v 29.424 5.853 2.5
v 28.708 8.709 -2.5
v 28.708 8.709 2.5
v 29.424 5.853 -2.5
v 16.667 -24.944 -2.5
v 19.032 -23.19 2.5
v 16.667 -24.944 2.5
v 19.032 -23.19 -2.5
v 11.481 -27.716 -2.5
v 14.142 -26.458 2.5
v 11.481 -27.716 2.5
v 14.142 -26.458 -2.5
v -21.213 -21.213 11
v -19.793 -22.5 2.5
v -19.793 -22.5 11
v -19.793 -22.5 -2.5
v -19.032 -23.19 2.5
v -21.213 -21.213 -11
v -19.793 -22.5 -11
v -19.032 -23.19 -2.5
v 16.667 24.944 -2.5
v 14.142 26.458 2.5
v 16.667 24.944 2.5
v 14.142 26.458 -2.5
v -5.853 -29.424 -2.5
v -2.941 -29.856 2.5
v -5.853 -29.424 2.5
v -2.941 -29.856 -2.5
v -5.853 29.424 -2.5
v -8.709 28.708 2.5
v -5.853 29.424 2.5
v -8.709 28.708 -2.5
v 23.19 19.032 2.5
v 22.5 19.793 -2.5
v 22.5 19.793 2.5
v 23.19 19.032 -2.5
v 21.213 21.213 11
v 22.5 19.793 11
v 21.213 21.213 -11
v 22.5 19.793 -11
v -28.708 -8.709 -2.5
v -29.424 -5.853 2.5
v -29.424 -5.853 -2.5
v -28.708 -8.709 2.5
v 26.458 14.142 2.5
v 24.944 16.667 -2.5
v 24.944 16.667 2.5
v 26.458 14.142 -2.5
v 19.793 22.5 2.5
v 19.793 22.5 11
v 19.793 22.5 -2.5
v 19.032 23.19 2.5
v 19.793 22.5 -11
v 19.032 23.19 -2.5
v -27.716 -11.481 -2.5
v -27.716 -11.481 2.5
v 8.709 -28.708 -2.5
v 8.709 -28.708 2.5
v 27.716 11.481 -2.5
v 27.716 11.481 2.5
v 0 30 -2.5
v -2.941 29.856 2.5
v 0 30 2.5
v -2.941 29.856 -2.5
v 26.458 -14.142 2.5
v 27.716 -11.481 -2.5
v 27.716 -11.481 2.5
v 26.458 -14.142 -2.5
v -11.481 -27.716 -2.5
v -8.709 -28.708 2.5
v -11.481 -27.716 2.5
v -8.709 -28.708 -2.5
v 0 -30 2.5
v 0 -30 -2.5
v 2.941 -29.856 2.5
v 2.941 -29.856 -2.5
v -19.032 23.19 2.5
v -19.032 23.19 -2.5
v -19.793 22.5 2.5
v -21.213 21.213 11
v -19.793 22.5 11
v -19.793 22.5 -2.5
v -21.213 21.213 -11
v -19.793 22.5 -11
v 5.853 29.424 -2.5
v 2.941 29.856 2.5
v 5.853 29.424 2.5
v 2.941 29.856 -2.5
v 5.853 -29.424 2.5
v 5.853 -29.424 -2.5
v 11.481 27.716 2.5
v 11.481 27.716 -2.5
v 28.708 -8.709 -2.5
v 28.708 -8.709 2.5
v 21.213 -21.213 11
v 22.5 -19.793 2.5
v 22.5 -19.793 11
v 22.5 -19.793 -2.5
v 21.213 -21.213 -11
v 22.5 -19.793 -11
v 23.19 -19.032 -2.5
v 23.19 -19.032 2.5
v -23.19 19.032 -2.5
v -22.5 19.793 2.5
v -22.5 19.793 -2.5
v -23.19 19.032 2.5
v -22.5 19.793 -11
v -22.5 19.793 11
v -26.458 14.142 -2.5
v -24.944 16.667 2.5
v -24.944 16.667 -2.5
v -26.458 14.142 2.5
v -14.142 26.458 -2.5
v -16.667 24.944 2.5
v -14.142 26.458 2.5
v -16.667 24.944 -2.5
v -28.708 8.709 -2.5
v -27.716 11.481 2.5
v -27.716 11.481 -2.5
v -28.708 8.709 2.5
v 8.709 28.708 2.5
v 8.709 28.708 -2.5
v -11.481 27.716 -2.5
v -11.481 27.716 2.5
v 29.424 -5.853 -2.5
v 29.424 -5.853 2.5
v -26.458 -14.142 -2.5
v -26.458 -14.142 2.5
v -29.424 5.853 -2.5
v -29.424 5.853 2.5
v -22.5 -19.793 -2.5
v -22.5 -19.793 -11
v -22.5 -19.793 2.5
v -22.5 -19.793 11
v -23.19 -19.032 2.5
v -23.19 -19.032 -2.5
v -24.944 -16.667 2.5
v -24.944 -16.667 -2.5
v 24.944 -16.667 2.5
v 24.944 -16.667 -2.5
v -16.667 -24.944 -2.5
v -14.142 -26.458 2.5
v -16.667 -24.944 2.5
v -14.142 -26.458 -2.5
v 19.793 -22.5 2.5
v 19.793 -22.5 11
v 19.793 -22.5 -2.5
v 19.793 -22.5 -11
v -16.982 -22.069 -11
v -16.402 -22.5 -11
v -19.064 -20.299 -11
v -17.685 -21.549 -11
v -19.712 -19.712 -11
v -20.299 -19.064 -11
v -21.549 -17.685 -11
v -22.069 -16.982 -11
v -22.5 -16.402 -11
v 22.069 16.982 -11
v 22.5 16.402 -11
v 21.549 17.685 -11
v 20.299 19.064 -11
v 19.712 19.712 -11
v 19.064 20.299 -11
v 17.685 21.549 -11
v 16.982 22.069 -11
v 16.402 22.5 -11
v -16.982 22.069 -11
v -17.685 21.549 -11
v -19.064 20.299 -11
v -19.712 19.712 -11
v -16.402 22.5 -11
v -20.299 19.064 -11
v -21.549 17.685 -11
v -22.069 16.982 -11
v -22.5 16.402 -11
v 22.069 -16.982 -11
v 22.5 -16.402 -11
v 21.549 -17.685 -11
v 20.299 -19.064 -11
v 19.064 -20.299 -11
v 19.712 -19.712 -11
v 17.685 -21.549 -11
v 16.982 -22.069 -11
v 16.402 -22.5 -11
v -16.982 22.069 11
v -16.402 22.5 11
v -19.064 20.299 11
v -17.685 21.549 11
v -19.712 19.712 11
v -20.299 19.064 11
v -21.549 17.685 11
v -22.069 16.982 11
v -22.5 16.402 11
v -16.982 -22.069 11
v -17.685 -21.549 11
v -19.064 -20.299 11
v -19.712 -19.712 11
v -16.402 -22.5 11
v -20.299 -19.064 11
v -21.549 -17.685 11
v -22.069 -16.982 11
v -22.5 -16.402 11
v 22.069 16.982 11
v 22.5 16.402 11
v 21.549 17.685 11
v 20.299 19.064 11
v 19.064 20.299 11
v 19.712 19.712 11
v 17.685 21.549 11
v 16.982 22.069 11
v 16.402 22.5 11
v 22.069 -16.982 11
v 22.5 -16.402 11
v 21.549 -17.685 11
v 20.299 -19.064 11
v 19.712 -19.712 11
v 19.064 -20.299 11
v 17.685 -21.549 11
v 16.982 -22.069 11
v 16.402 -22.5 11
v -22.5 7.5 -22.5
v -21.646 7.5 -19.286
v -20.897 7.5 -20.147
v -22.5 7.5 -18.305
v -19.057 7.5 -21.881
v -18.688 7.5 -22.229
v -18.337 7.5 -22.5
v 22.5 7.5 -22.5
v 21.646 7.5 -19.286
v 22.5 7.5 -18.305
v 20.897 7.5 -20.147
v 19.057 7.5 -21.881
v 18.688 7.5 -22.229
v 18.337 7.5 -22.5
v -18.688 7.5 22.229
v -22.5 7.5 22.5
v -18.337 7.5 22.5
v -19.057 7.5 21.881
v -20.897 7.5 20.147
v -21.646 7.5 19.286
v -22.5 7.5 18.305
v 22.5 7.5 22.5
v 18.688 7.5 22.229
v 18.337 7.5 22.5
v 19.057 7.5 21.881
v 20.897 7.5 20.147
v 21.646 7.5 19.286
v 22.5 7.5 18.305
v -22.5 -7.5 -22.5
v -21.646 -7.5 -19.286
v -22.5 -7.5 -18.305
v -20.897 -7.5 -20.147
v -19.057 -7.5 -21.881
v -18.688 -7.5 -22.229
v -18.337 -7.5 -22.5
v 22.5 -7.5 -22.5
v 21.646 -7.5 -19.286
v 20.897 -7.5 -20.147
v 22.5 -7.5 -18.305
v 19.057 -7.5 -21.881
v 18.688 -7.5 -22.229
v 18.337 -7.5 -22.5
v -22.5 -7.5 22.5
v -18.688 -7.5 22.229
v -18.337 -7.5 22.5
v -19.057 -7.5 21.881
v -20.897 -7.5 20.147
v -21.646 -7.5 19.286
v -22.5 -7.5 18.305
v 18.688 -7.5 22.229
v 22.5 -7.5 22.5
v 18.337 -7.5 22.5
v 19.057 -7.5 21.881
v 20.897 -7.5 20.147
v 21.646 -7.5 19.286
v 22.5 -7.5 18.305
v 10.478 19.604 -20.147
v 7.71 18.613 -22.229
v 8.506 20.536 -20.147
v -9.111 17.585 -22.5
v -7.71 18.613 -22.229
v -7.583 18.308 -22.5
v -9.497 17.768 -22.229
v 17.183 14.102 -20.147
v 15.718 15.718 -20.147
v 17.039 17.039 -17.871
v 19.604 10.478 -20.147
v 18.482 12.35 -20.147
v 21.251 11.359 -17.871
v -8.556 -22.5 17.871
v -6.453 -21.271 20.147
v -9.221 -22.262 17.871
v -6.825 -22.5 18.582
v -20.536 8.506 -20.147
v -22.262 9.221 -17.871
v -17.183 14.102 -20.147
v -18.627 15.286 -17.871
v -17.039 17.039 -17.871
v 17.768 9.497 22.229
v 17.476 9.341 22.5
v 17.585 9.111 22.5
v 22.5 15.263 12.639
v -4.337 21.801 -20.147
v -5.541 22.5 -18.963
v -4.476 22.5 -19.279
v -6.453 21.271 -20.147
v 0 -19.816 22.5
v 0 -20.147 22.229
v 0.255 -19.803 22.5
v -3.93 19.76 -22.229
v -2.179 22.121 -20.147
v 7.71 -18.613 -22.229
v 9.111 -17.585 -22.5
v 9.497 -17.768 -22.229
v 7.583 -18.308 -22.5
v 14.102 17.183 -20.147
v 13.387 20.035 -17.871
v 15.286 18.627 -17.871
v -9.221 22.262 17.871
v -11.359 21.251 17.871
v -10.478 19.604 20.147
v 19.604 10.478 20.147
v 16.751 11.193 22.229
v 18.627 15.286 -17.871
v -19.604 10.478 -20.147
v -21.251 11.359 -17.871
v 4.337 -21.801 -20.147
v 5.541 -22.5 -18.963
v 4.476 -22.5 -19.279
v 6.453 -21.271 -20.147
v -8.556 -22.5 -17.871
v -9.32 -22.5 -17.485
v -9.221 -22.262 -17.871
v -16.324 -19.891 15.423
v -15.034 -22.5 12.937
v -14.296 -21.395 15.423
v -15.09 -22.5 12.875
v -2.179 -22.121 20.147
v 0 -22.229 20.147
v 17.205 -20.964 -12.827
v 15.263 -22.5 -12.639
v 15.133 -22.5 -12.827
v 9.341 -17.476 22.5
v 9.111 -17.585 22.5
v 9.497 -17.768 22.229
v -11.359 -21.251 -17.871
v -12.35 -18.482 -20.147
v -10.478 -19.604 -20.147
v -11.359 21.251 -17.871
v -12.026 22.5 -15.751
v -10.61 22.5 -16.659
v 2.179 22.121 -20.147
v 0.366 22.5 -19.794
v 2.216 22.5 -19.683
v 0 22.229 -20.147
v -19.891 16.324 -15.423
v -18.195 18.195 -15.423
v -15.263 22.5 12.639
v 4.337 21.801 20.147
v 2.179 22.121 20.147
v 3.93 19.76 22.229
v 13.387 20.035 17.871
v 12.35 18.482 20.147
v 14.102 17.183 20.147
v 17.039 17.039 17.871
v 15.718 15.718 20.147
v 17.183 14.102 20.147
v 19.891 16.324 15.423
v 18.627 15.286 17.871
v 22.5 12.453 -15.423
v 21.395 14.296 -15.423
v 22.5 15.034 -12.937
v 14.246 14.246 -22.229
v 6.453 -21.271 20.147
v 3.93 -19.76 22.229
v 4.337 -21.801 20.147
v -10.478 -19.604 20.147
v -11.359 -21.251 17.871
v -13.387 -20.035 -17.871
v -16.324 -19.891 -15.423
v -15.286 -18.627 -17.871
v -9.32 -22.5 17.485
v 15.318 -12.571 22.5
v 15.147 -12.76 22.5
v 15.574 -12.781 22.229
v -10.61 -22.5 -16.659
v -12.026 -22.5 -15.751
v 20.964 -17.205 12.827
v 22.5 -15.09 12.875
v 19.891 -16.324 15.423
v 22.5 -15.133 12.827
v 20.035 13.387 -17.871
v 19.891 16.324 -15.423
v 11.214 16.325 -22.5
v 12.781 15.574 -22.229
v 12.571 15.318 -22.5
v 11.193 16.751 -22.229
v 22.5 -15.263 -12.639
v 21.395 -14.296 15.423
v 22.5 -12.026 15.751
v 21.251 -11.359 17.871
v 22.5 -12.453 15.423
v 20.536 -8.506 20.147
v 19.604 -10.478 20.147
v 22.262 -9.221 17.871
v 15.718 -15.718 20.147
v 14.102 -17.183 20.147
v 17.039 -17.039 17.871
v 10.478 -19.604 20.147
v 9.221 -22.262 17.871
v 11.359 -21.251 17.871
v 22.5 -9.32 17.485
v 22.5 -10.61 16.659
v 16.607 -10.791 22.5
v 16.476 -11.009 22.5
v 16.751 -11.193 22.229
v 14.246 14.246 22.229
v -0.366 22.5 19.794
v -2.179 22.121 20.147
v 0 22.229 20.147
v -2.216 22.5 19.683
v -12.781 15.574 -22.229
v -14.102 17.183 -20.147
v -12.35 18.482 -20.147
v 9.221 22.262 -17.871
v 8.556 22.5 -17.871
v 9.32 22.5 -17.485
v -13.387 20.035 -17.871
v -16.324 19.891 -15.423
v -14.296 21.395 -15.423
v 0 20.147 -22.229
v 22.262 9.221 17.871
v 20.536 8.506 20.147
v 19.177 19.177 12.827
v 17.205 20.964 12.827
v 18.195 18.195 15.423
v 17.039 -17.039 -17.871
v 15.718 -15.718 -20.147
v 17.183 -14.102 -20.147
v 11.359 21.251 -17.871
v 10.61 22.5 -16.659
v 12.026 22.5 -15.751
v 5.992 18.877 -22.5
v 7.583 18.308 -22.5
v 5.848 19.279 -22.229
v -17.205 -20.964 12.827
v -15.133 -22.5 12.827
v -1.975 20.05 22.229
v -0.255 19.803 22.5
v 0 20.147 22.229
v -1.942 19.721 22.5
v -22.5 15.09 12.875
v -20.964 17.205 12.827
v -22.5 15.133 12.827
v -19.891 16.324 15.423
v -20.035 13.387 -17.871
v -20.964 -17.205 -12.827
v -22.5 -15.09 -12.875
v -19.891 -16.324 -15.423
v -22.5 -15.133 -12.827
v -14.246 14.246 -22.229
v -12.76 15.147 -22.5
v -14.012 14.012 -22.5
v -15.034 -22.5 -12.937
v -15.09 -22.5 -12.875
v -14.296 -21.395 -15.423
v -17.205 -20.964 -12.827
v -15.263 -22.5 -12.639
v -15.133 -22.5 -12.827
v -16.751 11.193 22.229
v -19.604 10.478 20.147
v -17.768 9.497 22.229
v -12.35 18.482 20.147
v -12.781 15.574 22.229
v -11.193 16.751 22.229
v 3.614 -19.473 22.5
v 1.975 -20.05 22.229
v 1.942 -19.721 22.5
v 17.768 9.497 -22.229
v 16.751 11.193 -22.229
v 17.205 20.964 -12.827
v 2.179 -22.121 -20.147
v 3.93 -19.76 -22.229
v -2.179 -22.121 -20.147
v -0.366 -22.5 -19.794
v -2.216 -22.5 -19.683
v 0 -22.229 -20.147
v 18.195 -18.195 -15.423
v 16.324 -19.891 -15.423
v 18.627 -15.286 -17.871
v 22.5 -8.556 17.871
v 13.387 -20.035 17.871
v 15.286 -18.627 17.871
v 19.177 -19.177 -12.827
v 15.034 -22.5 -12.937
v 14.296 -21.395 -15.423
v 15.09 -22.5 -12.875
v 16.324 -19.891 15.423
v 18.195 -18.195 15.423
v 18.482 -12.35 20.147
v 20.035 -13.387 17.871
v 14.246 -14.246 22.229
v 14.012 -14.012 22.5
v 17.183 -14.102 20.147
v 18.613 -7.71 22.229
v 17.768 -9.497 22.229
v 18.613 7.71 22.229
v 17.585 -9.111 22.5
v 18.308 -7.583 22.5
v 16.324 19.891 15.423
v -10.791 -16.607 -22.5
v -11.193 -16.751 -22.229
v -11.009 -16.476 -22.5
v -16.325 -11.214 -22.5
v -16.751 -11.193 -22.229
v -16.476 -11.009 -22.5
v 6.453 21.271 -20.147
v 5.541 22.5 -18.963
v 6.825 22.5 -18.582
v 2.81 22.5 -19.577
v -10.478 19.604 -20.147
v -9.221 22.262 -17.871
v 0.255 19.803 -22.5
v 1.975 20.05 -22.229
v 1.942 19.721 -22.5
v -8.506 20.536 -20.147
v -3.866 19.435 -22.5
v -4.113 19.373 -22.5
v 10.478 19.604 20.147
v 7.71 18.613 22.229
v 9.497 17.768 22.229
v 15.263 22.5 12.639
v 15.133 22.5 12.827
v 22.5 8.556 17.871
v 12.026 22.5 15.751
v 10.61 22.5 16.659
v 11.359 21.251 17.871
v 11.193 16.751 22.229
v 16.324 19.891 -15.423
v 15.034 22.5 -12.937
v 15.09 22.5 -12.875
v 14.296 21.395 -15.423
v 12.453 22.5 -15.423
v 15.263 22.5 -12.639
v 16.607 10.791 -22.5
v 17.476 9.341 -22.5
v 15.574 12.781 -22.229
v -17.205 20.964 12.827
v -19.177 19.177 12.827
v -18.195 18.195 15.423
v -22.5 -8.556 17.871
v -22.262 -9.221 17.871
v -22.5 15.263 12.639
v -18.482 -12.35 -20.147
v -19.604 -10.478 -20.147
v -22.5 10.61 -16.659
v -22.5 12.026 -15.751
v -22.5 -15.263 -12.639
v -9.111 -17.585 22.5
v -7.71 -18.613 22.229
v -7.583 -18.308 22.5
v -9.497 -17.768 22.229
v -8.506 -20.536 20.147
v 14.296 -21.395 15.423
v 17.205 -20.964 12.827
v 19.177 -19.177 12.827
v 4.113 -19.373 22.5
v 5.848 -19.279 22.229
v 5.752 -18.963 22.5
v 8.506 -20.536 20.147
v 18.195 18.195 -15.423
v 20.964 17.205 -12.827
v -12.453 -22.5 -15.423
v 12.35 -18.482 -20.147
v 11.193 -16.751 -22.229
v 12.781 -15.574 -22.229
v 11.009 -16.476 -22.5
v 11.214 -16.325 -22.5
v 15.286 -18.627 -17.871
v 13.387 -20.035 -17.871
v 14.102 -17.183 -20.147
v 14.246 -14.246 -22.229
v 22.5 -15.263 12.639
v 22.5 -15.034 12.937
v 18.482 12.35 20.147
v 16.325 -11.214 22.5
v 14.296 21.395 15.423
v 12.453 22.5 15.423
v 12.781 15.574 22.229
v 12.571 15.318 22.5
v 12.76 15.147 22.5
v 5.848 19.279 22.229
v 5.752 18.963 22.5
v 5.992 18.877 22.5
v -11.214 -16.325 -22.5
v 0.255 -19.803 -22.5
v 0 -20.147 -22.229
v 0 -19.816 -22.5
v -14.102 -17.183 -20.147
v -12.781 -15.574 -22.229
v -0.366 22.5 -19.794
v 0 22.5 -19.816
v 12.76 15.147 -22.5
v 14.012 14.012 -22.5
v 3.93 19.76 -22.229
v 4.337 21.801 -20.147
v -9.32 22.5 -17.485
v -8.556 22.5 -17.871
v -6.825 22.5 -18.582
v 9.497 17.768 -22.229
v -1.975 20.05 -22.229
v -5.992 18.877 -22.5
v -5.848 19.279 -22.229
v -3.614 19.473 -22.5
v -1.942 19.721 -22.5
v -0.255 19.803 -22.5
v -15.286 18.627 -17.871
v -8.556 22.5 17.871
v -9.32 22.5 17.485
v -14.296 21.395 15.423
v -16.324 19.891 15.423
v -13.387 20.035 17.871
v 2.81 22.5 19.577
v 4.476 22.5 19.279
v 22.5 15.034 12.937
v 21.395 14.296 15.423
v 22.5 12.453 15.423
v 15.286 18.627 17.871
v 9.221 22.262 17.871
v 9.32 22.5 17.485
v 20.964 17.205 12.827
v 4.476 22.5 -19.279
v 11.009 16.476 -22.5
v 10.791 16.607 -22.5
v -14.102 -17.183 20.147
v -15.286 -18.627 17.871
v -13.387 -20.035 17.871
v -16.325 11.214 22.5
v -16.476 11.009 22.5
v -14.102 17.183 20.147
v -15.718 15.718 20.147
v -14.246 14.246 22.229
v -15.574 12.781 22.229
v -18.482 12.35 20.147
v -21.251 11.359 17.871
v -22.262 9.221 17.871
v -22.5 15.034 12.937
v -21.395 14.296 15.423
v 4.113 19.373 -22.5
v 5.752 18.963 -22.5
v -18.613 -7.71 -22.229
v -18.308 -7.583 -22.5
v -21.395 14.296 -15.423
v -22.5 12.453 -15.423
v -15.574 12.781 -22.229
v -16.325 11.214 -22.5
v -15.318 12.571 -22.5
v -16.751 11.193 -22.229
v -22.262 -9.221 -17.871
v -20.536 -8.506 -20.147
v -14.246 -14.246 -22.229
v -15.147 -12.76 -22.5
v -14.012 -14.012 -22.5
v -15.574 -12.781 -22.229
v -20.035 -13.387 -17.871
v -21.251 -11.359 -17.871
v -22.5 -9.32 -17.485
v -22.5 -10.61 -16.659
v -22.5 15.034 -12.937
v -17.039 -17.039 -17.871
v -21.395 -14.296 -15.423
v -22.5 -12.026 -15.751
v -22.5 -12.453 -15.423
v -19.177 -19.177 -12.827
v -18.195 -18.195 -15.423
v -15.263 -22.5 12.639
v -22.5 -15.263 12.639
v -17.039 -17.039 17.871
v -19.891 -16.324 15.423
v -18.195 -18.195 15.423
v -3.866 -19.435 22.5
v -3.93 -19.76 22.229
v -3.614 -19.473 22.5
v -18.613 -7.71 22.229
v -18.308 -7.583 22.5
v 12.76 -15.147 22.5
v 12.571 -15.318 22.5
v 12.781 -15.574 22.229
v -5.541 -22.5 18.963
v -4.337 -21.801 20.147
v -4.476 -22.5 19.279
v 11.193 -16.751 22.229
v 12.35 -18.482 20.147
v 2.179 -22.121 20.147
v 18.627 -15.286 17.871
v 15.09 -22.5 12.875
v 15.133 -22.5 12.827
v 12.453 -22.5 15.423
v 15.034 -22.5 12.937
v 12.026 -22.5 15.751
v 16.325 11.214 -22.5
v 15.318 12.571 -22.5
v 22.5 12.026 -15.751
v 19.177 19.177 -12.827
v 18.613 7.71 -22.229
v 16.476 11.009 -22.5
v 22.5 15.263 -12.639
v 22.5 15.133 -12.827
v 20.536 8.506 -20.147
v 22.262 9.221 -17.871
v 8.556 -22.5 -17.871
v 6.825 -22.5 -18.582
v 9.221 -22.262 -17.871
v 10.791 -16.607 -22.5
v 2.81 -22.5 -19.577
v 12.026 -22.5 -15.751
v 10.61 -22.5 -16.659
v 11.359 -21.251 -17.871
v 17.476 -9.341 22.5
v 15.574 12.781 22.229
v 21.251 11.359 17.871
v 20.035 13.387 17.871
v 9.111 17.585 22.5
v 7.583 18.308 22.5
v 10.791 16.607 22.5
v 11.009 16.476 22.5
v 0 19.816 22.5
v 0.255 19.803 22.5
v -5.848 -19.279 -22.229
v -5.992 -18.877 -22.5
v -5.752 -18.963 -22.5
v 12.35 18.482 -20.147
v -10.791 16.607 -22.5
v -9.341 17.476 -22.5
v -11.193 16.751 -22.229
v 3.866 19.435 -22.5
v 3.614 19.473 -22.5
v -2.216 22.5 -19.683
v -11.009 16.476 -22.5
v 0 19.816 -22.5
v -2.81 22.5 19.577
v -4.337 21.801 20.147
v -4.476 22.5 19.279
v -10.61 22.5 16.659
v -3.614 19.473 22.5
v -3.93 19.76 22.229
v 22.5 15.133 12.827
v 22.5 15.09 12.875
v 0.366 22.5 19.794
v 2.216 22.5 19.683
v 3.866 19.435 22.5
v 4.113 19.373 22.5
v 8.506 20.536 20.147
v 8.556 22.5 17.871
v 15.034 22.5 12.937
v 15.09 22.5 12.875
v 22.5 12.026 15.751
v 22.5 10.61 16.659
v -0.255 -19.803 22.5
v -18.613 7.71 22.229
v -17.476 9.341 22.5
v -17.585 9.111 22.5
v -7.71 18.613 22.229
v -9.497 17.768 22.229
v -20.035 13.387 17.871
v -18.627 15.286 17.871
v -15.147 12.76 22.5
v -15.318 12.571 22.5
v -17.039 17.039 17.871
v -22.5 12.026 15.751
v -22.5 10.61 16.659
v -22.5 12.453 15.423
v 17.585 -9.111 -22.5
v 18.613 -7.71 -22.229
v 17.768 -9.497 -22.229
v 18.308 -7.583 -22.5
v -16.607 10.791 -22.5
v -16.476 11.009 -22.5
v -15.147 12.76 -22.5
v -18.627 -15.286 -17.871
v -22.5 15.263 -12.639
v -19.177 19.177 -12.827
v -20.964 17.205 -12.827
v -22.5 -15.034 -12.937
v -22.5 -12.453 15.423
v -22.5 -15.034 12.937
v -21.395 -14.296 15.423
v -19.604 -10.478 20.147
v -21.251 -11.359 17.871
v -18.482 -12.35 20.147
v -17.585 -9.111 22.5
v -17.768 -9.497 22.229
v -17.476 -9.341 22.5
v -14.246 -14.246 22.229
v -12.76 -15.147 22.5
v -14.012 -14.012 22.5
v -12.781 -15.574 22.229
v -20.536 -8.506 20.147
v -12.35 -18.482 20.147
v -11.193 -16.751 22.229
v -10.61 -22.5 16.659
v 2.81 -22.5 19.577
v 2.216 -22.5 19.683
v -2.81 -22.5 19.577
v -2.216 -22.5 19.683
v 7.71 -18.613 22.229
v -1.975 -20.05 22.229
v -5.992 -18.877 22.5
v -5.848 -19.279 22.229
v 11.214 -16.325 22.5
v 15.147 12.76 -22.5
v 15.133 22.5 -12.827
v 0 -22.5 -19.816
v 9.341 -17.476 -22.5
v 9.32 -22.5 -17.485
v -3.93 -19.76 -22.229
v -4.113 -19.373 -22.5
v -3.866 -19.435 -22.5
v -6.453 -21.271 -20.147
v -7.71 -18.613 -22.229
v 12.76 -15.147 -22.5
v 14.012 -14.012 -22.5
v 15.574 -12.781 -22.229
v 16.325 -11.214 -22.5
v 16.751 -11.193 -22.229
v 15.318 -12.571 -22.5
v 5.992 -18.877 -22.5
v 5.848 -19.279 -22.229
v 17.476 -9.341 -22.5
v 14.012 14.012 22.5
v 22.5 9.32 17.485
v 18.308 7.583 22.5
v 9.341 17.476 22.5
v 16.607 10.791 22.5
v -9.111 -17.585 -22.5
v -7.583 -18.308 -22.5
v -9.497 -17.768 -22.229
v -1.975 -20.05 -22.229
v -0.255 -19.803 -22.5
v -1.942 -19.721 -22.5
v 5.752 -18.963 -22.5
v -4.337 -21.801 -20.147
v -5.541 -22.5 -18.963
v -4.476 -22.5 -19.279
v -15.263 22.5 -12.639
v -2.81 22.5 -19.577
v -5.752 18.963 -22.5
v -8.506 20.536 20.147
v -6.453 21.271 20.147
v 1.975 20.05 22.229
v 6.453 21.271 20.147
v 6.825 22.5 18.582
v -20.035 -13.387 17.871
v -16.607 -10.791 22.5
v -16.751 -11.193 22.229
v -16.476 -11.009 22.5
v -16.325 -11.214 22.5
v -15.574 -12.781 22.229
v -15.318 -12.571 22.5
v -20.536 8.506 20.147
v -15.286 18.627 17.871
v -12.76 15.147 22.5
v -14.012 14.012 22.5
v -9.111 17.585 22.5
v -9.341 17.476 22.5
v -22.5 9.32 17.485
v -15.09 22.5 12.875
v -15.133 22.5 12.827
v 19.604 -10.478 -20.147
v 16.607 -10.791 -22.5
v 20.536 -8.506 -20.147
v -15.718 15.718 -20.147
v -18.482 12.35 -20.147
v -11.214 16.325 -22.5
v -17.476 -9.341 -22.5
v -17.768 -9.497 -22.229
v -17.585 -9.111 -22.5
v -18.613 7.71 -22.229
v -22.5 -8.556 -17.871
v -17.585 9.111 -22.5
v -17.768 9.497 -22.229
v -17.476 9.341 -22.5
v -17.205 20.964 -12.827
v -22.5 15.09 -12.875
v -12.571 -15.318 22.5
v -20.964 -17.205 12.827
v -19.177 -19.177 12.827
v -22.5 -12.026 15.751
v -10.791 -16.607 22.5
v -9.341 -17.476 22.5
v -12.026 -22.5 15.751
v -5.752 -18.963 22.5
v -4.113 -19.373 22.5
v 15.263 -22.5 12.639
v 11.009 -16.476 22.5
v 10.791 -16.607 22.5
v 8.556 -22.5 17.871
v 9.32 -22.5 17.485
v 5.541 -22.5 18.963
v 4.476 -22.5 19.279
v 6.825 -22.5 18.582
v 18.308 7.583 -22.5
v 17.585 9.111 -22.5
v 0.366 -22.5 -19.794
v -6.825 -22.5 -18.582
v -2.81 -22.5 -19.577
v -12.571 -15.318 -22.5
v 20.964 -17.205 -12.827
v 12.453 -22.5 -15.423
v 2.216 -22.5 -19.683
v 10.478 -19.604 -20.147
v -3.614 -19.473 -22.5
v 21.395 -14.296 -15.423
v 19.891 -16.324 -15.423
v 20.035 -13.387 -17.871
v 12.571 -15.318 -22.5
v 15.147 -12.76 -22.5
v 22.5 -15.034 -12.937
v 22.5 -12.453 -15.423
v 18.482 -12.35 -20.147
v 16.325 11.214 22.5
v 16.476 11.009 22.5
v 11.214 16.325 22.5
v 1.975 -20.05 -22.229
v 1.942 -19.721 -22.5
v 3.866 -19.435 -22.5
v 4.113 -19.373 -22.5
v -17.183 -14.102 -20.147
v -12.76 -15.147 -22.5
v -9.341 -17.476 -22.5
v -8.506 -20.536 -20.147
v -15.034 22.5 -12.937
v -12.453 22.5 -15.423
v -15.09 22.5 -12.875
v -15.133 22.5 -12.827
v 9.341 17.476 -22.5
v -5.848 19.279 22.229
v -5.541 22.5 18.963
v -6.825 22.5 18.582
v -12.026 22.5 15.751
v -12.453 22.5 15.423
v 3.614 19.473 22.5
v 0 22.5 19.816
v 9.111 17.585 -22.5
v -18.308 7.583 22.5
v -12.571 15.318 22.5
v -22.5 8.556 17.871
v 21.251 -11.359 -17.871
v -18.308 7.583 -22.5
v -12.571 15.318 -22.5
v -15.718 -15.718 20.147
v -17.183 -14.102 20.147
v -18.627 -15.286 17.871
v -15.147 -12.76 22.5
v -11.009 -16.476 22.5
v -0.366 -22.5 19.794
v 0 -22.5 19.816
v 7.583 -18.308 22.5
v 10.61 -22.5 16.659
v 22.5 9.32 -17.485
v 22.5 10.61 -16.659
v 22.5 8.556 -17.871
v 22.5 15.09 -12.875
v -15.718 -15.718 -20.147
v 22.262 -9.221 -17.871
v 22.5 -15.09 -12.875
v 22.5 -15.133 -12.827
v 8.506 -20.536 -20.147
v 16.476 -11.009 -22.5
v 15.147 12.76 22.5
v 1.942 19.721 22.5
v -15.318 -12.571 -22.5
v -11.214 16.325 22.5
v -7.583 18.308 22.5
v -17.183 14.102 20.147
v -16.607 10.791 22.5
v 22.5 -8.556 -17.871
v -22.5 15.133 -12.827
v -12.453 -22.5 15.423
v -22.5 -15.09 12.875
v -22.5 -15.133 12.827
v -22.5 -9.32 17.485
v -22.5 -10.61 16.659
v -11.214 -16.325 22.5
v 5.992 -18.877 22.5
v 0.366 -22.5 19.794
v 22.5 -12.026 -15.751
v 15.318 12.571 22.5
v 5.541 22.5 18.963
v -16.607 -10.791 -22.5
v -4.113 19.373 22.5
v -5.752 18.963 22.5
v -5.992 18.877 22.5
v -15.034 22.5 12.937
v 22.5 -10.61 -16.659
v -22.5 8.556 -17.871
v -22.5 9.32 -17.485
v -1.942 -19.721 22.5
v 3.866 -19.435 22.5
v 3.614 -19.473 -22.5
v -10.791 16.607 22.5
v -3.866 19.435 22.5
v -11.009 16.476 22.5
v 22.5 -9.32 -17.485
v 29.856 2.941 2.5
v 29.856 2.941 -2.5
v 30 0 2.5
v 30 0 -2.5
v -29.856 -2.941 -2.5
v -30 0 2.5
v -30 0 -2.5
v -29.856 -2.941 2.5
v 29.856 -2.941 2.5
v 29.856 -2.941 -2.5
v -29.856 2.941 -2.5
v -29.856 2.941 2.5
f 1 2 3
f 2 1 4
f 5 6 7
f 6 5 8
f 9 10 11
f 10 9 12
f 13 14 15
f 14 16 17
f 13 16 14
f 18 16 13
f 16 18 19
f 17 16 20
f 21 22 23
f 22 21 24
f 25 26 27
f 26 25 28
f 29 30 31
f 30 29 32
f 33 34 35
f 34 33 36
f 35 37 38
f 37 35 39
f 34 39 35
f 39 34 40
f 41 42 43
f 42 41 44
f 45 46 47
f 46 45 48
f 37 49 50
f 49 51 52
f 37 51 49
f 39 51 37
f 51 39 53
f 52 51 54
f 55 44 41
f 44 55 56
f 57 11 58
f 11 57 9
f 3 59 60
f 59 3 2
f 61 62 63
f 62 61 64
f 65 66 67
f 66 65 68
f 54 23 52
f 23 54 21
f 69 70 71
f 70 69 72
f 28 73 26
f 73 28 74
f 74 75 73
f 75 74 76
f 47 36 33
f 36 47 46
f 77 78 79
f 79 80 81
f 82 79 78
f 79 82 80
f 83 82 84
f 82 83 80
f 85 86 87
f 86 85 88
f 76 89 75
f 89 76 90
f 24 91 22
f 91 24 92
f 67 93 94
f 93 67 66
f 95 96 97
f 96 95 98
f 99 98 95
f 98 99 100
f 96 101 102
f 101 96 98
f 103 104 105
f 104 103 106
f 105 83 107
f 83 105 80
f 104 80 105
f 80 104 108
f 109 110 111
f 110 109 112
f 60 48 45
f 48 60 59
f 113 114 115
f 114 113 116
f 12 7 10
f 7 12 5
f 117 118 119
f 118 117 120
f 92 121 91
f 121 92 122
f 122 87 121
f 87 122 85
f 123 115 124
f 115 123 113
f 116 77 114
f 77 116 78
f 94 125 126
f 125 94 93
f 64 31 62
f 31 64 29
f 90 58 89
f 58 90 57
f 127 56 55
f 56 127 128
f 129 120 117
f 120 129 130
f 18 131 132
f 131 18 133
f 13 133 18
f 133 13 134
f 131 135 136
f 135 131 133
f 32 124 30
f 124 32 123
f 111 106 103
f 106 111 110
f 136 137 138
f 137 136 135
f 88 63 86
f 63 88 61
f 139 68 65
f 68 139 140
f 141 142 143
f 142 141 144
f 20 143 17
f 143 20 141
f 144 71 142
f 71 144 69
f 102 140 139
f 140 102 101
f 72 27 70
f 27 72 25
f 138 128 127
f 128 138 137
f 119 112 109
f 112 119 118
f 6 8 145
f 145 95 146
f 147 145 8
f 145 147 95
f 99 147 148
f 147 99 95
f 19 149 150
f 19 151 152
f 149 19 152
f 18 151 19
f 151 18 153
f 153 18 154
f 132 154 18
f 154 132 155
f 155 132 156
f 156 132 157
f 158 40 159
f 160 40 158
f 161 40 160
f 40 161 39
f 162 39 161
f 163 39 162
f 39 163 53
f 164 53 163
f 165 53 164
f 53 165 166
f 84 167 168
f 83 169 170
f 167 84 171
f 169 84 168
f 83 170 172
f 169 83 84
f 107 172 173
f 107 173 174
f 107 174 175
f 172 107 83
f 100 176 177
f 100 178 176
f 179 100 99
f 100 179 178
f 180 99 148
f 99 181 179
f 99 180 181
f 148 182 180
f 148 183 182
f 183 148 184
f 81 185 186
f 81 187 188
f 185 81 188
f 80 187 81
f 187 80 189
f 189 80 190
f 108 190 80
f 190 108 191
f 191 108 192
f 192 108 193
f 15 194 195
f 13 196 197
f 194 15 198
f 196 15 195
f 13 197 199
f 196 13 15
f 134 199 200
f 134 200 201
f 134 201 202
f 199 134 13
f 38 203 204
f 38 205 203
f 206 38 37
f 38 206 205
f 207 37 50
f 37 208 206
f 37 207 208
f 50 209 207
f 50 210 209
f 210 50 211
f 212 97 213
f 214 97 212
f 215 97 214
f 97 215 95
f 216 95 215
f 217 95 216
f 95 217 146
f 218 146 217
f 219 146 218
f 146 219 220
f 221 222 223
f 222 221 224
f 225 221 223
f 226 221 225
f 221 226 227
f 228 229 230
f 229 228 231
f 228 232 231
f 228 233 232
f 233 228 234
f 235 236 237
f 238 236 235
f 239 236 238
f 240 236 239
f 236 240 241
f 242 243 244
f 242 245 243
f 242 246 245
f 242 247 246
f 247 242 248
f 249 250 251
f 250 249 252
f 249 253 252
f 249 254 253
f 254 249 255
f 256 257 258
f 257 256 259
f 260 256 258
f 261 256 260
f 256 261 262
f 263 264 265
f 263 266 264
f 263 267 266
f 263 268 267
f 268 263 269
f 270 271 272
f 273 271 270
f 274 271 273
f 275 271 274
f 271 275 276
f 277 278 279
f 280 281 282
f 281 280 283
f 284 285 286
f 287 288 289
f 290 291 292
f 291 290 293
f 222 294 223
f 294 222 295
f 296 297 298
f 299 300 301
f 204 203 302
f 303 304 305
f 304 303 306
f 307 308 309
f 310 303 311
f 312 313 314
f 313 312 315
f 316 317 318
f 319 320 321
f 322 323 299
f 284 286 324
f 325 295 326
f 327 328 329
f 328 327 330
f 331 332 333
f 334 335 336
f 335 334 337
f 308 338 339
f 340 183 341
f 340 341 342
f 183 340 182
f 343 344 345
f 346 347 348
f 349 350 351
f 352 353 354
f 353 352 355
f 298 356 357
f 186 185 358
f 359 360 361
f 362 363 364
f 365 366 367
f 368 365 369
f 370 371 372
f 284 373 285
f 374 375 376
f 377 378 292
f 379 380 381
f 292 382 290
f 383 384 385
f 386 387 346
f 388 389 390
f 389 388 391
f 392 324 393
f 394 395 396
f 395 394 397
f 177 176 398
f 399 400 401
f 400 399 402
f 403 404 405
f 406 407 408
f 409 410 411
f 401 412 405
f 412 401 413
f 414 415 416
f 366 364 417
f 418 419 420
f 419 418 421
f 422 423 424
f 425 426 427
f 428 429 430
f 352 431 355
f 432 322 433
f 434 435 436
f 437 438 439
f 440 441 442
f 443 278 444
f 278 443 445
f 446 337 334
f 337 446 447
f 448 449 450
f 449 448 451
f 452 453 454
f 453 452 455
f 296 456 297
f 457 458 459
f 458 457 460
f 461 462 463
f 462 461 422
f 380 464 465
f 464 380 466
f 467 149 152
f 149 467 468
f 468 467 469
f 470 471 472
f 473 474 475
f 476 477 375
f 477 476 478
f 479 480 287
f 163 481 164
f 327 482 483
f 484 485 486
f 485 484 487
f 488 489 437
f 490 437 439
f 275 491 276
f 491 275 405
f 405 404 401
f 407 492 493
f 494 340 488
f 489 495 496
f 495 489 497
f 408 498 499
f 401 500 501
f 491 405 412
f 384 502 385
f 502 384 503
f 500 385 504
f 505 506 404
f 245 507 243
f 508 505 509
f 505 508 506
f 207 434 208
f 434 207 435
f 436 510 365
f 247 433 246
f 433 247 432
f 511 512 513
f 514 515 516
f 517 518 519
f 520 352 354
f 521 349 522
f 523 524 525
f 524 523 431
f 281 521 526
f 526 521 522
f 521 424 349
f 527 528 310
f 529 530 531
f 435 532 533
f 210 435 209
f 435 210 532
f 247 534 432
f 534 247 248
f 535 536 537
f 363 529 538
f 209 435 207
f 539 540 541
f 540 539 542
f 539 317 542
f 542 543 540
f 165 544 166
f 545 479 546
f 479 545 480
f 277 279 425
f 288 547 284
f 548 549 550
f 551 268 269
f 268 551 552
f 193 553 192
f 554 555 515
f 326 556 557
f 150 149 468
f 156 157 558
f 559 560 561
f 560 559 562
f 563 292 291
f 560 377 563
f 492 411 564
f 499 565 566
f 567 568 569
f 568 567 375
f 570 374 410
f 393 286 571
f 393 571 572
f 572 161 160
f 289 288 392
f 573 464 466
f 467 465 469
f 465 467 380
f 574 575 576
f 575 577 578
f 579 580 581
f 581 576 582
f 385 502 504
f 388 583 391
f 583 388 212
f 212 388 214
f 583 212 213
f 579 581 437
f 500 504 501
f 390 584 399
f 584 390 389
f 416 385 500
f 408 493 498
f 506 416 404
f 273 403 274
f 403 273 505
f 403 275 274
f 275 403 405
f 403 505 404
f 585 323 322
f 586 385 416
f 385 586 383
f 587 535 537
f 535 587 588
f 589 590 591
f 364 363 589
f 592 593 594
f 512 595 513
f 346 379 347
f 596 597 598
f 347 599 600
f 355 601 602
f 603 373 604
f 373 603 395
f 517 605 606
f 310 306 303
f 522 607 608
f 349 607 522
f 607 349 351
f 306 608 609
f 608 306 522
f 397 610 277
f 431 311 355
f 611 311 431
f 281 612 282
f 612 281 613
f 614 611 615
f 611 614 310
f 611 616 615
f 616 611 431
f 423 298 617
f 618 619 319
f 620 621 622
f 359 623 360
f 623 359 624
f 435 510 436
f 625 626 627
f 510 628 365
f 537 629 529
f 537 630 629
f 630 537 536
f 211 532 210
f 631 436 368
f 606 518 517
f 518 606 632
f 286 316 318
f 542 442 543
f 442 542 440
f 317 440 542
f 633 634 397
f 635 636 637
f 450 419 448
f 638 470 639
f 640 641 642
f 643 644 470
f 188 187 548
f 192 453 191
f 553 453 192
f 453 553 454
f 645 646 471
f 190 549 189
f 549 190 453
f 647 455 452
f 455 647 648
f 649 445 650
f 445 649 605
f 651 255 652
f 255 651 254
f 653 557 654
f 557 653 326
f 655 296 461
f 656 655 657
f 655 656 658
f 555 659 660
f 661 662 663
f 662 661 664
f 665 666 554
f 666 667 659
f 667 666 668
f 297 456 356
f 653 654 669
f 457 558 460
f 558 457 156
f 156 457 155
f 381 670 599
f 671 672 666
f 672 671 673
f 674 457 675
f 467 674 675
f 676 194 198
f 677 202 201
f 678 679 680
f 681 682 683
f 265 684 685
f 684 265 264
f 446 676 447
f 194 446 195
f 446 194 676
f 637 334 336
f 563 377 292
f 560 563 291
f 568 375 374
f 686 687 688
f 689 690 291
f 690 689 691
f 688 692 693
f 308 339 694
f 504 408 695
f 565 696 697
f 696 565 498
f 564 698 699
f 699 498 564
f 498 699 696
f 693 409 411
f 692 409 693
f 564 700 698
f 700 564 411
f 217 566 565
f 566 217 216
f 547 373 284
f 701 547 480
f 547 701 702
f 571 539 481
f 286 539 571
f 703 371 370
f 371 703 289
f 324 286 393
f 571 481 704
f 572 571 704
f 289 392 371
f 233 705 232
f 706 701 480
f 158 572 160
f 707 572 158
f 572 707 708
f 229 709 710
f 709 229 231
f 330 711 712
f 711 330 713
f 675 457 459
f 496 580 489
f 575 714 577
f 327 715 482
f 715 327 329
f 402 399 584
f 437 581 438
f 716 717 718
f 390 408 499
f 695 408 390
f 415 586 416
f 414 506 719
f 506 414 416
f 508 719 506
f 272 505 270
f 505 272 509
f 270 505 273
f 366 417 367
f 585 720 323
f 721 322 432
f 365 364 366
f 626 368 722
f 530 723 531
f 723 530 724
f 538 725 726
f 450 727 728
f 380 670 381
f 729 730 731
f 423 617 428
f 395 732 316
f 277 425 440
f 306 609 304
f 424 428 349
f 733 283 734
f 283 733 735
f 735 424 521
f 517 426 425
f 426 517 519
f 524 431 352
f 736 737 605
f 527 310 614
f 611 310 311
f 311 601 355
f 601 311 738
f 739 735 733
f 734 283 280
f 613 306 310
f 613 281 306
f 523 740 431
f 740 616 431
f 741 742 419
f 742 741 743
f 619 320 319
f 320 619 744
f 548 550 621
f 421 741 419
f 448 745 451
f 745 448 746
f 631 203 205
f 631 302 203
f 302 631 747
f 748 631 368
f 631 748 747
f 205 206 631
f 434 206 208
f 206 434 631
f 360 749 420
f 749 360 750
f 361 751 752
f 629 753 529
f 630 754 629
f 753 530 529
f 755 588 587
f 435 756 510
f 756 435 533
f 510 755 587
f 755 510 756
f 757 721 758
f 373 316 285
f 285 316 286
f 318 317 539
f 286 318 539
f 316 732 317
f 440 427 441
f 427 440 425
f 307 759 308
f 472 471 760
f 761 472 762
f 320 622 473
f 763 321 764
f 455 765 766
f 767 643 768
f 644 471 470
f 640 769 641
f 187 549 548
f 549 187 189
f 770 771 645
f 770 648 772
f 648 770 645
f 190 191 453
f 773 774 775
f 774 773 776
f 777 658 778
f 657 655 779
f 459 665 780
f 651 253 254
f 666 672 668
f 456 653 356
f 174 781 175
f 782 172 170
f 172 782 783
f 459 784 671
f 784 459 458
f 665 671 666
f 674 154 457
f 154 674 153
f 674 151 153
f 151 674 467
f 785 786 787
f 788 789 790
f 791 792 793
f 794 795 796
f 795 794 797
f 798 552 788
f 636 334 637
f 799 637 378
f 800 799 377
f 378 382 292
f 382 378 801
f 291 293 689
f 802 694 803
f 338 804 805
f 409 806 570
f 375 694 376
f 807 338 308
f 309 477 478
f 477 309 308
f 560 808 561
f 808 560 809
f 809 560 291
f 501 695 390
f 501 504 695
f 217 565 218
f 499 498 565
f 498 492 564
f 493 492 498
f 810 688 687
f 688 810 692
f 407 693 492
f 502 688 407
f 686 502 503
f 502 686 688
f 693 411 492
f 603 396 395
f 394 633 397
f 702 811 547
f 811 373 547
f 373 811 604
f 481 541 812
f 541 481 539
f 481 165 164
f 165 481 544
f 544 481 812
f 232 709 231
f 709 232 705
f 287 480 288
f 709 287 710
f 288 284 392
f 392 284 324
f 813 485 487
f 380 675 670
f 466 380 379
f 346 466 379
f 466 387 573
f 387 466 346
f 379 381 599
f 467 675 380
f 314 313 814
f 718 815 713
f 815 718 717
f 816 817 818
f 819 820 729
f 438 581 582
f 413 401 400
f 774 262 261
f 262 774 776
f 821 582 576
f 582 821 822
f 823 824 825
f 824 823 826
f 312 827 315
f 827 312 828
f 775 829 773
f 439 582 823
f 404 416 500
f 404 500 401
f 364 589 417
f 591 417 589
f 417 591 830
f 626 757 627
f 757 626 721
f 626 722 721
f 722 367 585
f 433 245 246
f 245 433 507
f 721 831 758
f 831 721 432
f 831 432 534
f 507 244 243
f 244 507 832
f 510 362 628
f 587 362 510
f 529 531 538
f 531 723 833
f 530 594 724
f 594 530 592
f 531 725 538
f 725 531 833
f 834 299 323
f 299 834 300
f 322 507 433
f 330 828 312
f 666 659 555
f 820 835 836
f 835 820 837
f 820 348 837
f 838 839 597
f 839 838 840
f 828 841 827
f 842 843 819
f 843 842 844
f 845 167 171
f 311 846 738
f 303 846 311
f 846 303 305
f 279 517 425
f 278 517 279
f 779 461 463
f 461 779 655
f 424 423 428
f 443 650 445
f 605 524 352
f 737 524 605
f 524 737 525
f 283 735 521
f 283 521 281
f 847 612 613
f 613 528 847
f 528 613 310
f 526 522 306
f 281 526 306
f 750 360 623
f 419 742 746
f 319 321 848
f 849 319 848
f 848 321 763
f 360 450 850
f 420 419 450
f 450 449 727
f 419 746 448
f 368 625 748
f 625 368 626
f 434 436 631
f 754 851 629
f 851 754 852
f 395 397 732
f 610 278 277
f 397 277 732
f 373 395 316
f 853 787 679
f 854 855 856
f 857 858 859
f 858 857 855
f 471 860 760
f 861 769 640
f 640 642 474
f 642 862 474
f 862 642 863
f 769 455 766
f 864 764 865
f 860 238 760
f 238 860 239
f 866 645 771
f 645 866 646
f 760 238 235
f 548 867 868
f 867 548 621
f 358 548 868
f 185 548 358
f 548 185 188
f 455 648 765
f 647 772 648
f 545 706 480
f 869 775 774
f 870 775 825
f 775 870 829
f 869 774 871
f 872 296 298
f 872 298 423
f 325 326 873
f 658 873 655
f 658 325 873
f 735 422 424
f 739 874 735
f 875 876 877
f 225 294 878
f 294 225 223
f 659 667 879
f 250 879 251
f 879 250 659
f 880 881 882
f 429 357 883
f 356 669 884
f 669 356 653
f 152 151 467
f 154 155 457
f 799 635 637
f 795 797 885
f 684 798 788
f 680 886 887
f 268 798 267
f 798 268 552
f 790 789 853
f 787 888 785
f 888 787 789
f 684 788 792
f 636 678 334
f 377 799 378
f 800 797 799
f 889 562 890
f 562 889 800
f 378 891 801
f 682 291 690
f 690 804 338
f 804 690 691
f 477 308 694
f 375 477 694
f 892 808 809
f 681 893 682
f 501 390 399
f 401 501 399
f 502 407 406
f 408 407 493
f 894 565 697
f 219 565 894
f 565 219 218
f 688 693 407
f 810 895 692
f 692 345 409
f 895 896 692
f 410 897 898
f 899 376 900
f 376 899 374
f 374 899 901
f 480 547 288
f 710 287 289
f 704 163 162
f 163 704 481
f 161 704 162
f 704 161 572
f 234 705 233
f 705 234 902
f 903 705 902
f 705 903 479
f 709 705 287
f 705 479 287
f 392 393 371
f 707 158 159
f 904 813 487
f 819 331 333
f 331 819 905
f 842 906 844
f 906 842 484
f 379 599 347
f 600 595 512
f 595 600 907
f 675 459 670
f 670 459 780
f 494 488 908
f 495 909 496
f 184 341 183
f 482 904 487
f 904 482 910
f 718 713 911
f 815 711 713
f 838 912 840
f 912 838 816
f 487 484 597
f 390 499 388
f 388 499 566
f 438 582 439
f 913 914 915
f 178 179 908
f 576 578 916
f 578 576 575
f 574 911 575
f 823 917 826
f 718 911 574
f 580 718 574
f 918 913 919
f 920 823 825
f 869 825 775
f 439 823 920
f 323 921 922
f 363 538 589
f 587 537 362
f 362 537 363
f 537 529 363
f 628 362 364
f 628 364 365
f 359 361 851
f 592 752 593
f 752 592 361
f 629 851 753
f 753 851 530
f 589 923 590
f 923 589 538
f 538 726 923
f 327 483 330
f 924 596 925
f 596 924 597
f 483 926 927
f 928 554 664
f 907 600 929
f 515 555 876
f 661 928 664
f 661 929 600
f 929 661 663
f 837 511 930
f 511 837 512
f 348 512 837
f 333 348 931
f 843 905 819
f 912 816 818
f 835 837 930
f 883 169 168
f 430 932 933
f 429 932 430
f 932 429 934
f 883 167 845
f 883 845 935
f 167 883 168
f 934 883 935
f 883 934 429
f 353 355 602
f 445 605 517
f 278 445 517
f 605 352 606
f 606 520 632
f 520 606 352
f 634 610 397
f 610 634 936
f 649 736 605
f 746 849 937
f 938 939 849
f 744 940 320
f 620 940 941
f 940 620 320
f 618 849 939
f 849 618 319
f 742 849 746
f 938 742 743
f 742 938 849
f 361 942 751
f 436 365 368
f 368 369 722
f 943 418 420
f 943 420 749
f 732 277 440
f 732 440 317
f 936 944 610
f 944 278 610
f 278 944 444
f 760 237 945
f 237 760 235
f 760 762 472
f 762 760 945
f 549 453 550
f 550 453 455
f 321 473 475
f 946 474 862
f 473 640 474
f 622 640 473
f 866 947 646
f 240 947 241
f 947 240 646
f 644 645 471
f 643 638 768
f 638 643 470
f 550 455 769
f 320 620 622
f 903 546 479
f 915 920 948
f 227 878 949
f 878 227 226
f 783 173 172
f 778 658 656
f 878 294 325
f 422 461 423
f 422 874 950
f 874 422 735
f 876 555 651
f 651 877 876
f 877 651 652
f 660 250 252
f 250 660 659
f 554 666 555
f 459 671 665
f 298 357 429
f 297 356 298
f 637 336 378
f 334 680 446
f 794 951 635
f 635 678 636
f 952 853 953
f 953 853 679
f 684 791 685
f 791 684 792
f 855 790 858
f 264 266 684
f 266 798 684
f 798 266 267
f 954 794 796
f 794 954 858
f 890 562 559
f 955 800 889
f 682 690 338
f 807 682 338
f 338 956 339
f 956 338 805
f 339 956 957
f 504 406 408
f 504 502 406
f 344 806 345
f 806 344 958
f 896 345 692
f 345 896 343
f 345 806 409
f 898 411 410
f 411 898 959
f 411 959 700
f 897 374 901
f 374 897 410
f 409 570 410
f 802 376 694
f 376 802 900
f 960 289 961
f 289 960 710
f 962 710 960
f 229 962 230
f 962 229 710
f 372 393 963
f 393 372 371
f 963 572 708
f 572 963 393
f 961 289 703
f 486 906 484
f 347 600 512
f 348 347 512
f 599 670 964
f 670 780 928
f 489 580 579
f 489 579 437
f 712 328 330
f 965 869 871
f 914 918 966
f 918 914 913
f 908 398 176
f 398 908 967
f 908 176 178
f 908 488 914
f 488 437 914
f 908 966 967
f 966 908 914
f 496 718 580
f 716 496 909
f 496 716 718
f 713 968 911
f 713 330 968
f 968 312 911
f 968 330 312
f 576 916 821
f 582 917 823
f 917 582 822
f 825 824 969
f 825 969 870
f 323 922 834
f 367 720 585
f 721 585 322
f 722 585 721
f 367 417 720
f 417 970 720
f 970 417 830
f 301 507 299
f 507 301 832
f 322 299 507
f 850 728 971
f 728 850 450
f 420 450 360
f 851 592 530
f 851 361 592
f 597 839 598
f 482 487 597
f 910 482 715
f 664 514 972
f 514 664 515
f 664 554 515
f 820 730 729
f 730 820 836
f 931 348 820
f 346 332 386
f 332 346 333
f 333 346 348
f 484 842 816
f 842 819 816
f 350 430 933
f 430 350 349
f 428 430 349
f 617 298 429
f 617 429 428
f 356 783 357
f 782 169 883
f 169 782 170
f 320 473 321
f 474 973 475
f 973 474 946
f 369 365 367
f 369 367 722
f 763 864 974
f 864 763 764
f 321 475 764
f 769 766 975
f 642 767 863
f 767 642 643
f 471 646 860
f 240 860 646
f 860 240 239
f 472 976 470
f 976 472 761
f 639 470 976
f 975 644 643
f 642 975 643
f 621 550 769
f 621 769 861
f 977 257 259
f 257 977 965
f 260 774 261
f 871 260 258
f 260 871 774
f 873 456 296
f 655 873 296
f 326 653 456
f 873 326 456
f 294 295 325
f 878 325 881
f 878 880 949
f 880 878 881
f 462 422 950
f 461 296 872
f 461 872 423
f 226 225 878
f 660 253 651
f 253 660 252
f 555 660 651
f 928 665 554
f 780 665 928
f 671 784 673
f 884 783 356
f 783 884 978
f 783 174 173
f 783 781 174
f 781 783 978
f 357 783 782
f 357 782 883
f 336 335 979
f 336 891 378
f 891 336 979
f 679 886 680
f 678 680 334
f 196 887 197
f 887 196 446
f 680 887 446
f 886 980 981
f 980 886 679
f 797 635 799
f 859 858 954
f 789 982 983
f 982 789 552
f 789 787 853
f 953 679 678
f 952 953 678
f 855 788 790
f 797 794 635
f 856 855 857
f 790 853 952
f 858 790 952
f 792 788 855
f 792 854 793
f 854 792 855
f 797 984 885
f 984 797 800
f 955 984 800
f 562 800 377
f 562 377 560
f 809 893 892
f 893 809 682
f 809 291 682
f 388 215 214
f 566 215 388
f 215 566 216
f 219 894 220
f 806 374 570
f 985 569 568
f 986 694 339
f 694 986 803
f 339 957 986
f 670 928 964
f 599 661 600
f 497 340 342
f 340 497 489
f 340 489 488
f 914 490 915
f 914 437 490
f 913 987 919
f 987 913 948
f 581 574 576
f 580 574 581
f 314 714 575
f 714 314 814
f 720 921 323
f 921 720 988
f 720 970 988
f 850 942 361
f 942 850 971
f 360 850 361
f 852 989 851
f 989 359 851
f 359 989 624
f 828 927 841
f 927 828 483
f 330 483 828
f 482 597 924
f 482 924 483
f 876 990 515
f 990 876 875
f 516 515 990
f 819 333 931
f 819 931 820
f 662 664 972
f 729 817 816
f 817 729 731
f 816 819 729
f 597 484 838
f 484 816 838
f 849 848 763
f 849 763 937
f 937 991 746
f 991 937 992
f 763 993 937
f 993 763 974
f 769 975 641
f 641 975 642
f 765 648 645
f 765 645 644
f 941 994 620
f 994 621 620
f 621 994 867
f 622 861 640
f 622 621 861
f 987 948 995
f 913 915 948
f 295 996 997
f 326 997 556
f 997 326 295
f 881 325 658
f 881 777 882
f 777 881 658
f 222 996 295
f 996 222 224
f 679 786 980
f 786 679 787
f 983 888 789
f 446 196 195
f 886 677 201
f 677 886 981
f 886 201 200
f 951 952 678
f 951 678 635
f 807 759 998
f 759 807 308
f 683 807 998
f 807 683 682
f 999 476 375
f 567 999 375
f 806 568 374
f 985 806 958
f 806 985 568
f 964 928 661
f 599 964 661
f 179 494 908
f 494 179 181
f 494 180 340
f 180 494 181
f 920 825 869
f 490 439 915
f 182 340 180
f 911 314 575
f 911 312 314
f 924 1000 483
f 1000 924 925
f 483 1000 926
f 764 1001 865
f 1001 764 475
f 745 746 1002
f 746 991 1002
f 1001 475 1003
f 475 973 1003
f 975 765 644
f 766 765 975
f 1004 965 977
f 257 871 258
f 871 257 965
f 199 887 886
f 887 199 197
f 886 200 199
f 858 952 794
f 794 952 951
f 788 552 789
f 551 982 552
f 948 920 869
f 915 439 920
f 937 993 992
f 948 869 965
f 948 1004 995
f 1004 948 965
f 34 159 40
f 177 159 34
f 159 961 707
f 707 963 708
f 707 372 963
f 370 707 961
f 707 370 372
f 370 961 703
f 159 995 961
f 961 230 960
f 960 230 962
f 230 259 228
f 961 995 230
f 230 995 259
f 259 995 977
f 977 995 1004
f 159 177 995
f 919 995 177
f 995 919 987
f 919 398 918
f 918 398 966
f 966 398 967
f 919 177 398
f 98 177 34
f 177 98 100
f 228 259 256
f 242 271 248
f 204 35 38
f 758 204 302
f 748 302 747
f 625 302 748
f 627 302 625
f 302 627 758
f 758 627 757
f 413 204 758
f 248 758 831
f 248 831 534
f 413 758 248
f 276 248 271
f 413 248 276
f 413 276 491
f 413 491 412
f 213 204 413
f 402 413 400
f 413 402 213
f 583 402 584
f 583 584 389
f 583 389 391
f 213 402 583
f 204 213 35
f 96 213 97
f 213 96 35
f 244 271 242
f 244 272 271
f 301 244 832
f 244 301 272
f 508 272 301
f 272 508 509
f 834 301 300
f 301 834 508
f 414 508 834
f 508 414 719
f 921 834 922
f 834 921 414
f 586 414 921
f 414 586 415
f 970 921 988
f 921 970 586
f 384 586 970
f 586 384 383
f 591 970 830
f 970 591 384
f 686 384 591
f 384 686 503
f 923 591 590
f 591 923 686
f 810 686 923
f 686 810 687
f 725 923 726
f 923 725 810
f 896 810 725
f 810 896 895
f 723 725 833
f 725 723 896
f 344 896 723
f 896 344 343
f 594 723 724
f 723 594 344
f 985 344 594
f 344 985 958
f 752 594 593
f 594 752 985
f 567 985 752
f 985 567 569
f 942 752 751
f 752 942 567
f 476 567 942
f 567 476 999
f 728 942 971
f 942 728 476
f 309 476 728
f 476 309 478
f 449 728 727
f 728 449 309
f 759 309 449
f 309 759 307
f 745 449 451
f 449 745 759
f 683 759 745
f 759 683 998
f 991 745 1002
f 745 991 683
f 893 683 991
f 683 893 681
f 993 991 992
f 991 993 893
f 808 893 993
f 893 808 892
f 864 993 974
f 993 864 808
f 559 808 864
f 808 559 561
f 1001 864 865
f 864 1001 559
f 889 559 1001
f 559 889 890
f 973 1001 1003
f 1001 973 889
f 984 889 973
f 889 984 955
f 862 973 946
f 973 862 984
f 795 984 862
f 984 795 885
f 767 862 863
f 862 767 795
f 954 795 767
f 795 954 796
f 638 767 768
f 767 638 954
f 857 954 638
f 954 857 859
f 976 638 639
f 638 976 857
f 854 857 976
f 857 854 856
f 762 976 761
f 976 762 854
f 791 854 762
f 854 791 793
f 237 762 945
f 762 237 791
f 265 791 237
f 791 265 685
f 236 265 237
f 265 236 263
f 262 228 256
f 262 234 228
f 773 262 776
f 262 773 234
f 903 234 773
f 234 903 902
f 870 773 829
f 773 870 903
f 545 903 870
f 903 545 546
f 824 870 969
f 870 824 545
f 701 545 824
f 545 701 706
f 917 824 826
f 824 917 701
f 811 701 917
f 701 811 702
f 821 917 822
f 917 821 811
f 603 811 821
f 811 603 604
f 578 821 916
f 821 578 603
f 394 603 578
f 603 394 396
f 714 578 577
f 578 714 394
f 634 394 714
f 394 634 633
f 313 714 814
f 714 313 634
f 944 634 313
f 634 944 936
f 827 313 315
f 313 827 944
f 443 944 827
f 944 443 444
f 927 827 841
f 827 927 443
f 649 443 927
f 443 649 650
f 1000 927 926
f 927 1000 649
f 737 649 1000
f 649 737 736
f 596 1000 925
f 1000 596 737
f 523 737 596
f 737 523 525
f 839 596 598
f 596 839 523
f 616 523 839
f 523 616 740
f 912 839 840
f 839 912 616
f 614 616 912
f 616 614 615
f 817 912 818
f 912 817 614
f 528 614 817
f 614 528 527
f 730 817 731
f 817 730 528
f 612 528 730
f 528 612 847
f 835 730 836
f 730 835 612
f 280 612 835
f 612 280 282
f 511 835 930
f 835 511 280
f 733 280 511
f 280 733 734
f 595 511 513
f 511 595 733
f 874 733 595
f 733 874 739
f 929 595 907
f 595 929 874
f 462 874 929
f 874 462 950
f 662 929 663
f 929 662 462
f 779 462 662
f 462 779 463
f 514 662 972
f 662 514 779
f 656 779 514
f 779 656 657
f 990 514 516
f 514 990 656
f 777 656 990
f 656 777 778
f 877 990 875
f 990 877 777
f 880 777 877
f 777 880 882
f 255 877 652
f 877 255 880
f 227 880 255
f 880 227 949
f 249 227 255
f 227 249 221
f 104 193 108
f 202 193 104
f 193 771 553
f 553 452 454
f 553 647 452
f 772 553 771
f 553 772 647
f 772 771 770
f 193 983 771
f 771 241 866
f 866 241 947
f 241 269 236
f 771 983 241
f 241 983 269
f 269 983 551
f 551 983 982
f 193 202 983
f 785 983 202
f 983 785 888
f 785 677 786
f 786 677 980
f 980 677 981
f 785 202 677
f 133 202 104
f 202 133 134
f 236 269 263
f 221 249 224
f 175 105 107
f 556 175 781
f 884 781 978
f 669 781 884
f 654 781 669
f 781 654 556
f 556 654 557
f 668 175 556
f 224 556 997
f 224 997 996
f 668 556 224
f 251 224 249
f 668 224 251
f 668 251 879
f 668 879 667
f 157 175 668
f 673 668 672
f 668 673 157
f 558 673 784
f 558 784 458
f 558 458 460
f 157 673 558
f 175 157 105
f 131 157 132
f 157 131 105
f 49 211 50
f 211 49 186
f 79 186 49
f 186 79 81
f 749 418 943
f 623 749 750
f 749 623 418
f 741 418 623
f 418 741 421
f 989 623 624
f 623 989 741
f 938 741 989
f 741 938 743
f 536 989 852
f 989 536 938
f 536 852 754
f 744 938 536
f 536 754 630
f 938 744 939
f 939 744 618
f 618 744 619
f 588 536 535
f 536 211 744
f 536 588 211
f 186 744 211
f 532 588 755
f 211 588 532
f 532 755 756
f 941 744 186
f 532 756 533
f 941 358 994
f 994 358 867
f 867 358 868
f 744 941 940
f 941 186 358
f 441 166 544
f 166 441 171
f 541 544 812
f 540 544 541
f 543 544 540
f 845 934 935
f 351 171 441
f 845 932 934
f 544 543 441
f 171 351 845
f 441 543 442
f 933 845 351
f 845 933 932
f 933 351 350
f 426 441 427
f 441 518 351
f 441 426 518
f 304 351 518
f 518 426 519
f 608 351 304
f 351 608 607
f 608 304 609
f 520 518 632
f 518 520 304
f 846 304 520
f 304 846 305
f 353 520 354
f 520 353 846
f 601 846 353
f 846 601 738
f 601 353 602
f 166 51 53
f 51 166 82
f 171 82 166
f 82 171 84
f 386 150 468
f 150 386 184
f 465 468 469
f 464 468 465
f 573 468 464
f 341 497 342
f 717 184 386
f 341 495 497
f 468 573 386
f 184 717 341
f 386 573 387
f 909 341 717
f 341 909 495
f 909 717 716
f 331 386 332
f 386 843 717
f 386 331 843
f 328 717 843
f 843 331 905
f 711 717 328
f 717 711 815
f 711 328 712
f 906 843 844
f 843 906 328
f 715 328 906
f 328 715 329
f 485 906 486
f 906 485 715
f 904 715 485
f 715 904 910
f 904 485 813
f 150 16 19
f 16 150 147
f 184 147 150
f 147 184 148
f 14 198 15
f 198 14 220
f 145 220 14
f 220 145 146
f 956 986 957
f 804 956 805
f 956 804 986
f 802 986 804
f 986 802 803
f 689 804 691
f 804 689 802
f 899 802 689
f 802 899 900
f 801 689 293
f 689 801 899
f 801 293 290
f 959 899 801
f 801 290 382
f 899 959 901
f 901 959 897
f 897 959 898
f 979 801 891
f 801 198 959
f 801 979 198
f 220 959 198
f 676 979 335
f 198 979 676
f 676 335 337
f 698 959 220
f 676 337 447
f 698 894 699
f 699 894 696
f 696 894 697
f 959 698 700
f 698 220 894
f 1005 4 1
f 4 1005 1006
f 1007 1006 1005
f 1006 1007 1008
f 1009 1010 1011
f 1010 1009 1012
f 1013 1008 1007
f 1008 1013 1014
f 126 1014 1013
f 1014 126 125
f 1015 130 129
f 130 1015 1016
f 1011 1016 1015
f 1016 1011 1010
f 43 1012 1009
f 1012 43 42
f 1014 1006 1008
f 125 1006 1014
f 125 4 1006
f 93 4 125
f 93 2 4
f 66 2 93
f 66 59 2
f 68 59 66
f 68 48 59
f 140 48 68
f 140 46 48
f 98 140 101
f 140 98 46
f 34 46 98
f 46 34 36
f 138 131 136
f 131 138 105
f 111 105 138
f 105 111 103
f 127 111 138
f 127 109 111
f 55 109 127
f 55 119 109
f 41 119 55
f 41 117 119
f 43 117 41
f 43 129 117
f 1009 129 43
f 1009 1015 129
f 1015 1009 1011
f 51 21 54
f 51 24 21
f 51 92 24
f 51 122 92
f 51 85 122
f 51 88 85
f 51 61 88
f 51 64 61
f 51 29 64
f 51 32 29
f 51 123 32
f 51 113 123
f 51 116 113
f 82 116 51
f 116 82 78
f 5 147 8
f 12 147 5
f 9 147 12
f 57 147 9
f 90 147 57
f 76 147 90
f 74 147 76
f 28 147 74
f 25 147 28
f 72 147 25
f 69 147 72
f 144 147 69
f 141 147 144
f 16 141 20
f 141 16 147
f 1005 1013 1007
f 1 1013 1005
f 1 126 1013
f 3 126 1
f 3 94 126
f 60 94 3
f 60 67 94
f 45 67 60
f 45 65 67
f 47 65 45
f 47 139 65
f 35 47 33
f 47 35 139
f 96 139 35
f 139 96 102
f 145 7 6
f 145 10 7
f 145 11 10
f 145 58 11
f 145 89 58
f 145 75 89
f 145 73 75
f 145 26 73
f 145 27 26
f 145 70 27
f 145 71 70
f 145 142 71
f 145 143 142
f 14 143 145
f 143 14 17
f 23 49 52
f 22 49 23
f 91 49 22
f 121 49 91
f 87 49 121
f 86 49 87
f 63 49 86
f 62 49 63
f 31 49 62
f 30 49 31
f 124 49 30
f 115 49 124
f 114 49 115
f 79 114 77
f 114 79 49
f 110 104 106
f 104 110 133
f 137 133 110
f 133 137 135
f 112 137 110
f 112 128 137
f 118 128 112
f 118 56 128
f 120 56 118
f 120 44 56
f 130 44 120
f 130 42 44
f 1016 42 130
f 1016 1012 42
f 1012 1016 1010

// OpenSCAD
$fn=64;
//globals
co_radius = 30;
co_height = 45;

module complexObject()
{
			intersection()
				{
			union()//subtract
				{
					cylinder(r=co_radius, h =22, center=true);
					rotate([90,0,0])
					cylinder(r=33, h =15, center=true);
					sphere(r=co_radius, center=true);
				}
				
				union()//add
				{
					cube([co_height,co_height,co_height], center=true);
					cylinder(r=co_radius, h=5, center=true);
						
					}
				}
			}

complexObject();
